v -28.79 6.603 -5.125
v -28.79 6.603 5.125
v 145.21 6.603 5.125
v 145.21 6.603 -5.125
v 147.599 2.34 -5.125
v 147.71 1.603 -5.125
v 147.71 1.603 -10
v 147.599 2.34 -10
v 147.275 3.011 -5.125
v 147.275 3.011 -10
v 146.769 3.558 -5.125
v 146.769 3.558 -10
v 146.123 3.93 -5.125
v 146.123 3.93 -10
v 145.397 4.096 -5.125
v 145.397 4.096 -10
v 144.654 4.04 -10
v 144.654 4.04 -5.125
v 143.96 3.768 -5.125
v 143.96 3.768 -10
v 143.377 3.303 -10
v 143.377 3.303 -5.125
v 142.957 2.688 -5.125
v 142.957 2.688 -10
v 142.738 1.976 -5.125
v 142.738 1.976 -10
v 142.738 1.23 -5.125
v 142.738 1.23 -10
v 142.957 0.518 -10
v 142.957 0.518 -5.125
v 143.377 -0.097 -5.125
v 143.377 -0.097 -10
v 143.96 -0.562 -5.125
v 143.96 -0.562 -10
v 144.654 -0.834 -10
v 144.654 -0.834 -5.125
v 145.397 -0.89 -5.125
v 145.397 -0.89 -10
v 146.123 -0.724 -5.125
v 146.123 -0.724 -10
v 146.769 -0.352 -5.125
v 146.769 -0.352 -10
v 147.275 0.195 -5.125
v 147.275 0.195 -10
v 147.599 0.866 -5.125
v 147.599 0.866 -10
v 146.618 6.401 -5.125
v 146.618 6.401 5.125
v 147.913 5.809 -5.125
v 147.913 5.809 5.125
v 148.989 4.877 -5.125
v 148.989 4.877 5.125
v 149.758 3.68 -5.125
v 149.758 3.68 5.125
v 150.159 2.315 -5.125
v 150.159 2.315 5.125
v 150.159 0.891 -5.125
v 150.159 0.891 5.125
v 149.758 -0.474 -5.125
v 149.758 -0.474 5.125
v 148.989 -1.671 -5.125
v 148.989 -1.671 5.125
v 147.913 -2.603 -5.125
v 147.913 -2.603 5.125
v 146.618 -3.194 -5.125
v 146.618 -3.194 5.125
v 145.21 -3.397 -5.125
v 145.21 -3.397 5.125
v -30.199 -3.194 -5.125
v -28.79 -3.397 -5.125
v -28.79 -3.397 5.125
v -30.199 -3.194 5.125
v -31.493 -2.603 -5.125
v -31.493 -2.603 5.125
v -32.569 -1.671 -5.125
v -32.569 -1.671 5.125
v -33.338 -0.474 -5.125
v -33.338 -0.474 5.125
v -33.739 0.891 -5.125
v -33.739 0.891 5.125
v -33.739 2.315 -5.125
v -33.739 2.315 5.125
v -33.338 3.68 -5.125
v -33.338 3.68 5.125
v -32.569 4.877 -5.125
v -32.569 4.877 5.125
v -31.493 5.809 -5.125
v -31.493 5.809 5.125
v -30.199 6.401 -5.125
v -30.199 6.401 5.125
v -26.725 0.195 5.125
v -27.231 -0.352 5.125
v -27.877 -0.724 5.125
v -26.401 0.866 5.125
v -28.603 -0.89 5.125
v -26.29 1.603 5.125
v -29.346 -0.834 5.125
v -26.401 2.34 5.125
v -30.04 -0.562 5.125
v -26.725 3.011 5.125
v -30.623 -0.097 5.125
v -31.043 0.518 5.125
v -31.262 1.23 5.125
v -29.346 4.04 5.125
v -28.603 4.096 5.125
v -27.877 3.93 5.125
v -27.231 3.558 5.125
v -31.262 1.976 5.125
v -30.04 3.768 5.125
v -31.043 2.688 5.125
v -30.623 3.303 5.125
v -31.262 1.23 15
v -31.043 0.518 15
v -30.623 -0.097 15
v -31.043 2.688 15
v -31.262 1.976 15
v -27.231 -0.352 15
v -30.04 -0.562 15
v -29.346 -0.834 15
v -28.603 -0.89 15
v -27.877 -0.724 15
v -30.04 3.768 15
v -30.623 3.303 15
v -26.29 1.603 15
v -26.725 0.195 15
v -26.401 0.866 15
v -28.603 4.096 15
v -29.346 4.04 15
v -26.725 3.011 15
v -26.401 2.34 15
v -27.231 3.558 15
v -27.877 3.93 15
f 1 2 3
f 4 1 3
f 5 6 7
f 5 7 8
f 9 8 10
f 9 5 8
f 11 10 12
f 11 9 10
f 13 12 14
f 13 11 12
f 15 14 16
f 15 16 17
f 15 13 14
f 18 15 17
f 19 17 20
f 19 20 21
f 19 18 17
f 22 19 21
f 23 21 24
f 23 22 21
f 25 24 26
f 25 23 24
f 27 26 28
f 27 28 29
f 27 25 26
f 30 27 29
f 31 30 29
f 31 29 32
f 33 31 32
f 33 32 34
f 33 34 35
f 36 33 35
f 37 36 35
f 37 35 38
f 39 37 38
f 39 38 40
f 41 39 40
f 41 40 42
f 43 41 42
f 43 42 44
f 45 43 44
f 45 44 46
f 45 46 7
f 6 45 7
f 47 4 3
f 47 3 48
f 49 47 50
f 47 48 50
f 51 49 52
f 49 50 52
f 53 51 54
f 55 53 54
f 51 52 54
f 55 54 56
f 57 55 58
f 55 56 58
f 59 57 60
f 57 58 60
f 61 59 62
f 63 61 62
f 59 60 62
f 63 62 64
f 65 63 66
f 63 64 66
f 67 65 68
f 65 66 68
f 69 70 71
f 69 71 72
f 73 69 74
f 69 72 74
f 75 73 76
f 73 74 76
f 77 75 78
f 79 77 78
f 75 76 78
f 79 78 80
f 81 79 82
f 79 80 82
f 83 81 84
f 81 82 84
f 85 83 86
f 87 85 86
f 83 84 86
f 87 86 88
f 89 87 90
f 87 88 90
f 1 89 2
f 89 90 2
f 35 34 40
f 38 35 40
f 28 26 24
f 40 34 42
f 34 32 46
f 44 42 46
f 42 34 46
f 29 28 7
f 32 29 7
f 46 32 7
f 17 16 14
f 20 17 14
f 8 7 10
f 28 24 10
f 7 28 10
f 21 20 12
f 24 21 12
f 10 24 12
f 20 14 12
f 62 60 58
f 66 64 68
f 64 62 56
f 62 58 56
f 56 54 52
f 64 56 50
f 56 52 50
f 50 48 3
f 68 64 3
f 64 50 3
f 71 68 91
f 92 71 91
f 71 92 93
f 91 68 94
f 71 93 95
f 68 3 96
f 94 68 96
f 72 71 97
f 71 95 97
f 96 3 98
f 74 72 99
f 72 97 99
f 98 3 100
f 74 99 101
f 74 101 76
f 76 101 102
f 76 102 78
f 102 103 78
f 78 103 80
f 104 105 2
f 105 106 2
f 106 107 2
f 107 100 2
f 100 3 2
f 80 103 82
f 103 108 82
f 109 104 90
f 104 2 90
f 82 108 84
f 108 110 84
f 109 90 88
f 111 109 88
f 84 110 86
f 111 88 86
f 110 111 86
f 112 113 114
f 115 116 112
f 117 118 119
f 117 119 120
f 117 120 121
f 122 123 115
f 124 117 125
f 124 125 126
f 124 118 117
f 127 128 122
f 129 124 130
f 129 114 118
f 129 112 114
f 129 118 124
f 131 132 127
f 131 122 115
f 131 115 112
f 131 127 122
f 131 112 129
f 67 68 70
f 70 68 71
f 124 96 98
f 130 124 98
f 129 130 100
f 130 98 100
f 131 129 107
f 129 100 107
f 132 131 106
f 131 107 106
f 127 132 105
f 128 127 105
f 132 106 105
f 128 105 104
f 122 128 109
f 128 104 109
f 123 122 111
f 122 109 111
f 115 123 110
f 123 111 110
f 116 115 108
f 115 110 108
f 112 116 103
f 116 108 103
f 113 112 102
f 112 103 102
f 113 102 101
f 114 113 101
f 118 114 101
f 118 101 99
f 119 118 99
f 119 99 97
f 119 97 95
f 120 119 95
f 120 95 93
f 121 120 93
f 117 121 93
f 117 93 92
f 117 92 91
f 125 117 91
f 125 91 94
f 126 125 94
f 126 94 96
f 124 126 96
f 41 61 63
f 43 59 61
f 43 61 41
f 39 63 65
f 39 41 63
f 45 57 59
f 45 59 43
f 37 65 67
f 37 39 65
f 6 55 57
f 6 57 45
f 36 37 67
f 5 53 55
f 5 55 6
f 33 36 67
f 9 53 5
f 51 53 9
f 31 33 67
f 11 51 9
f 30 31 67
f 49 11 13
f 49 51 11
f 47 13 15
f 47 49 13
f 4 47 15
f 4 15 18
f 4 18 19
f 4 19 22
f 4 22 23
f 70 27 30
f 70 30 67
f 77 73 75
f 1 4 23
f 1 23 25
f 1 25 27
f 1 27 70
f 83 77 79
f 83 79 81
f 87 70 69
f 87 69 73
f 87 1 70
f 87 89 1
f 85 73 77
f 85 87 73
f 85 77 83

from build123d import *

# Parameters (mm, degrees)
BOSS_EXTRU_1_DEPTH = 5.125
ESQUISSE2_R        = 2.5
BOSS_EXTRU_2_DEPTH = 15
ESQUISSE3_R        = 2.5
BOSS_EXTRU_3_DEPTH = 10


with BuildPart() as part:
    # Esquisse1 → Boss.-Extru.1 (new body, symmetric)
    with BuildSketch(Plane.XY):
        with BuildLine():
            Line((-28.790189362, 6.603053435), (145.209810638, 6.603053435))
            ThreePointArc((145.209810638, 6.603053435), (150.209810638, 1.603053435), (145.209810638, -3.396946565))
            Line((145.209810638, -3.396946565), (-28.790189362, -3.396946565))
            ThreePointArc((-28.790189362, -3.396946565), (-33.790189362, 1.603053435), (-28.790189362, 6.603053435))
        make_face()
    extrude(amount=BOSS_EXTRU_1_DEPTH, both=True)

    # Esquisse2 → Boss.-Extru.2 (add)
    with BuildSketch(Plane.XY):
        with Locations((-28.790189362, 1.603053435)):
            Circle(ESQUISSE2_R)
    extrude(amount=BOSS_EXTRU_2_DEPTH)

    # Esquisse3 → Boss.-Extru.3 (add)
    with BuildSketch(Plane.XY):
        with Locations((145.209810638, 1.603053435)):
            Circle(ESQUISSE3_R)
    extrude(amount=-BOSS_EXTRU_3_DEPTH)


solid = part.part
